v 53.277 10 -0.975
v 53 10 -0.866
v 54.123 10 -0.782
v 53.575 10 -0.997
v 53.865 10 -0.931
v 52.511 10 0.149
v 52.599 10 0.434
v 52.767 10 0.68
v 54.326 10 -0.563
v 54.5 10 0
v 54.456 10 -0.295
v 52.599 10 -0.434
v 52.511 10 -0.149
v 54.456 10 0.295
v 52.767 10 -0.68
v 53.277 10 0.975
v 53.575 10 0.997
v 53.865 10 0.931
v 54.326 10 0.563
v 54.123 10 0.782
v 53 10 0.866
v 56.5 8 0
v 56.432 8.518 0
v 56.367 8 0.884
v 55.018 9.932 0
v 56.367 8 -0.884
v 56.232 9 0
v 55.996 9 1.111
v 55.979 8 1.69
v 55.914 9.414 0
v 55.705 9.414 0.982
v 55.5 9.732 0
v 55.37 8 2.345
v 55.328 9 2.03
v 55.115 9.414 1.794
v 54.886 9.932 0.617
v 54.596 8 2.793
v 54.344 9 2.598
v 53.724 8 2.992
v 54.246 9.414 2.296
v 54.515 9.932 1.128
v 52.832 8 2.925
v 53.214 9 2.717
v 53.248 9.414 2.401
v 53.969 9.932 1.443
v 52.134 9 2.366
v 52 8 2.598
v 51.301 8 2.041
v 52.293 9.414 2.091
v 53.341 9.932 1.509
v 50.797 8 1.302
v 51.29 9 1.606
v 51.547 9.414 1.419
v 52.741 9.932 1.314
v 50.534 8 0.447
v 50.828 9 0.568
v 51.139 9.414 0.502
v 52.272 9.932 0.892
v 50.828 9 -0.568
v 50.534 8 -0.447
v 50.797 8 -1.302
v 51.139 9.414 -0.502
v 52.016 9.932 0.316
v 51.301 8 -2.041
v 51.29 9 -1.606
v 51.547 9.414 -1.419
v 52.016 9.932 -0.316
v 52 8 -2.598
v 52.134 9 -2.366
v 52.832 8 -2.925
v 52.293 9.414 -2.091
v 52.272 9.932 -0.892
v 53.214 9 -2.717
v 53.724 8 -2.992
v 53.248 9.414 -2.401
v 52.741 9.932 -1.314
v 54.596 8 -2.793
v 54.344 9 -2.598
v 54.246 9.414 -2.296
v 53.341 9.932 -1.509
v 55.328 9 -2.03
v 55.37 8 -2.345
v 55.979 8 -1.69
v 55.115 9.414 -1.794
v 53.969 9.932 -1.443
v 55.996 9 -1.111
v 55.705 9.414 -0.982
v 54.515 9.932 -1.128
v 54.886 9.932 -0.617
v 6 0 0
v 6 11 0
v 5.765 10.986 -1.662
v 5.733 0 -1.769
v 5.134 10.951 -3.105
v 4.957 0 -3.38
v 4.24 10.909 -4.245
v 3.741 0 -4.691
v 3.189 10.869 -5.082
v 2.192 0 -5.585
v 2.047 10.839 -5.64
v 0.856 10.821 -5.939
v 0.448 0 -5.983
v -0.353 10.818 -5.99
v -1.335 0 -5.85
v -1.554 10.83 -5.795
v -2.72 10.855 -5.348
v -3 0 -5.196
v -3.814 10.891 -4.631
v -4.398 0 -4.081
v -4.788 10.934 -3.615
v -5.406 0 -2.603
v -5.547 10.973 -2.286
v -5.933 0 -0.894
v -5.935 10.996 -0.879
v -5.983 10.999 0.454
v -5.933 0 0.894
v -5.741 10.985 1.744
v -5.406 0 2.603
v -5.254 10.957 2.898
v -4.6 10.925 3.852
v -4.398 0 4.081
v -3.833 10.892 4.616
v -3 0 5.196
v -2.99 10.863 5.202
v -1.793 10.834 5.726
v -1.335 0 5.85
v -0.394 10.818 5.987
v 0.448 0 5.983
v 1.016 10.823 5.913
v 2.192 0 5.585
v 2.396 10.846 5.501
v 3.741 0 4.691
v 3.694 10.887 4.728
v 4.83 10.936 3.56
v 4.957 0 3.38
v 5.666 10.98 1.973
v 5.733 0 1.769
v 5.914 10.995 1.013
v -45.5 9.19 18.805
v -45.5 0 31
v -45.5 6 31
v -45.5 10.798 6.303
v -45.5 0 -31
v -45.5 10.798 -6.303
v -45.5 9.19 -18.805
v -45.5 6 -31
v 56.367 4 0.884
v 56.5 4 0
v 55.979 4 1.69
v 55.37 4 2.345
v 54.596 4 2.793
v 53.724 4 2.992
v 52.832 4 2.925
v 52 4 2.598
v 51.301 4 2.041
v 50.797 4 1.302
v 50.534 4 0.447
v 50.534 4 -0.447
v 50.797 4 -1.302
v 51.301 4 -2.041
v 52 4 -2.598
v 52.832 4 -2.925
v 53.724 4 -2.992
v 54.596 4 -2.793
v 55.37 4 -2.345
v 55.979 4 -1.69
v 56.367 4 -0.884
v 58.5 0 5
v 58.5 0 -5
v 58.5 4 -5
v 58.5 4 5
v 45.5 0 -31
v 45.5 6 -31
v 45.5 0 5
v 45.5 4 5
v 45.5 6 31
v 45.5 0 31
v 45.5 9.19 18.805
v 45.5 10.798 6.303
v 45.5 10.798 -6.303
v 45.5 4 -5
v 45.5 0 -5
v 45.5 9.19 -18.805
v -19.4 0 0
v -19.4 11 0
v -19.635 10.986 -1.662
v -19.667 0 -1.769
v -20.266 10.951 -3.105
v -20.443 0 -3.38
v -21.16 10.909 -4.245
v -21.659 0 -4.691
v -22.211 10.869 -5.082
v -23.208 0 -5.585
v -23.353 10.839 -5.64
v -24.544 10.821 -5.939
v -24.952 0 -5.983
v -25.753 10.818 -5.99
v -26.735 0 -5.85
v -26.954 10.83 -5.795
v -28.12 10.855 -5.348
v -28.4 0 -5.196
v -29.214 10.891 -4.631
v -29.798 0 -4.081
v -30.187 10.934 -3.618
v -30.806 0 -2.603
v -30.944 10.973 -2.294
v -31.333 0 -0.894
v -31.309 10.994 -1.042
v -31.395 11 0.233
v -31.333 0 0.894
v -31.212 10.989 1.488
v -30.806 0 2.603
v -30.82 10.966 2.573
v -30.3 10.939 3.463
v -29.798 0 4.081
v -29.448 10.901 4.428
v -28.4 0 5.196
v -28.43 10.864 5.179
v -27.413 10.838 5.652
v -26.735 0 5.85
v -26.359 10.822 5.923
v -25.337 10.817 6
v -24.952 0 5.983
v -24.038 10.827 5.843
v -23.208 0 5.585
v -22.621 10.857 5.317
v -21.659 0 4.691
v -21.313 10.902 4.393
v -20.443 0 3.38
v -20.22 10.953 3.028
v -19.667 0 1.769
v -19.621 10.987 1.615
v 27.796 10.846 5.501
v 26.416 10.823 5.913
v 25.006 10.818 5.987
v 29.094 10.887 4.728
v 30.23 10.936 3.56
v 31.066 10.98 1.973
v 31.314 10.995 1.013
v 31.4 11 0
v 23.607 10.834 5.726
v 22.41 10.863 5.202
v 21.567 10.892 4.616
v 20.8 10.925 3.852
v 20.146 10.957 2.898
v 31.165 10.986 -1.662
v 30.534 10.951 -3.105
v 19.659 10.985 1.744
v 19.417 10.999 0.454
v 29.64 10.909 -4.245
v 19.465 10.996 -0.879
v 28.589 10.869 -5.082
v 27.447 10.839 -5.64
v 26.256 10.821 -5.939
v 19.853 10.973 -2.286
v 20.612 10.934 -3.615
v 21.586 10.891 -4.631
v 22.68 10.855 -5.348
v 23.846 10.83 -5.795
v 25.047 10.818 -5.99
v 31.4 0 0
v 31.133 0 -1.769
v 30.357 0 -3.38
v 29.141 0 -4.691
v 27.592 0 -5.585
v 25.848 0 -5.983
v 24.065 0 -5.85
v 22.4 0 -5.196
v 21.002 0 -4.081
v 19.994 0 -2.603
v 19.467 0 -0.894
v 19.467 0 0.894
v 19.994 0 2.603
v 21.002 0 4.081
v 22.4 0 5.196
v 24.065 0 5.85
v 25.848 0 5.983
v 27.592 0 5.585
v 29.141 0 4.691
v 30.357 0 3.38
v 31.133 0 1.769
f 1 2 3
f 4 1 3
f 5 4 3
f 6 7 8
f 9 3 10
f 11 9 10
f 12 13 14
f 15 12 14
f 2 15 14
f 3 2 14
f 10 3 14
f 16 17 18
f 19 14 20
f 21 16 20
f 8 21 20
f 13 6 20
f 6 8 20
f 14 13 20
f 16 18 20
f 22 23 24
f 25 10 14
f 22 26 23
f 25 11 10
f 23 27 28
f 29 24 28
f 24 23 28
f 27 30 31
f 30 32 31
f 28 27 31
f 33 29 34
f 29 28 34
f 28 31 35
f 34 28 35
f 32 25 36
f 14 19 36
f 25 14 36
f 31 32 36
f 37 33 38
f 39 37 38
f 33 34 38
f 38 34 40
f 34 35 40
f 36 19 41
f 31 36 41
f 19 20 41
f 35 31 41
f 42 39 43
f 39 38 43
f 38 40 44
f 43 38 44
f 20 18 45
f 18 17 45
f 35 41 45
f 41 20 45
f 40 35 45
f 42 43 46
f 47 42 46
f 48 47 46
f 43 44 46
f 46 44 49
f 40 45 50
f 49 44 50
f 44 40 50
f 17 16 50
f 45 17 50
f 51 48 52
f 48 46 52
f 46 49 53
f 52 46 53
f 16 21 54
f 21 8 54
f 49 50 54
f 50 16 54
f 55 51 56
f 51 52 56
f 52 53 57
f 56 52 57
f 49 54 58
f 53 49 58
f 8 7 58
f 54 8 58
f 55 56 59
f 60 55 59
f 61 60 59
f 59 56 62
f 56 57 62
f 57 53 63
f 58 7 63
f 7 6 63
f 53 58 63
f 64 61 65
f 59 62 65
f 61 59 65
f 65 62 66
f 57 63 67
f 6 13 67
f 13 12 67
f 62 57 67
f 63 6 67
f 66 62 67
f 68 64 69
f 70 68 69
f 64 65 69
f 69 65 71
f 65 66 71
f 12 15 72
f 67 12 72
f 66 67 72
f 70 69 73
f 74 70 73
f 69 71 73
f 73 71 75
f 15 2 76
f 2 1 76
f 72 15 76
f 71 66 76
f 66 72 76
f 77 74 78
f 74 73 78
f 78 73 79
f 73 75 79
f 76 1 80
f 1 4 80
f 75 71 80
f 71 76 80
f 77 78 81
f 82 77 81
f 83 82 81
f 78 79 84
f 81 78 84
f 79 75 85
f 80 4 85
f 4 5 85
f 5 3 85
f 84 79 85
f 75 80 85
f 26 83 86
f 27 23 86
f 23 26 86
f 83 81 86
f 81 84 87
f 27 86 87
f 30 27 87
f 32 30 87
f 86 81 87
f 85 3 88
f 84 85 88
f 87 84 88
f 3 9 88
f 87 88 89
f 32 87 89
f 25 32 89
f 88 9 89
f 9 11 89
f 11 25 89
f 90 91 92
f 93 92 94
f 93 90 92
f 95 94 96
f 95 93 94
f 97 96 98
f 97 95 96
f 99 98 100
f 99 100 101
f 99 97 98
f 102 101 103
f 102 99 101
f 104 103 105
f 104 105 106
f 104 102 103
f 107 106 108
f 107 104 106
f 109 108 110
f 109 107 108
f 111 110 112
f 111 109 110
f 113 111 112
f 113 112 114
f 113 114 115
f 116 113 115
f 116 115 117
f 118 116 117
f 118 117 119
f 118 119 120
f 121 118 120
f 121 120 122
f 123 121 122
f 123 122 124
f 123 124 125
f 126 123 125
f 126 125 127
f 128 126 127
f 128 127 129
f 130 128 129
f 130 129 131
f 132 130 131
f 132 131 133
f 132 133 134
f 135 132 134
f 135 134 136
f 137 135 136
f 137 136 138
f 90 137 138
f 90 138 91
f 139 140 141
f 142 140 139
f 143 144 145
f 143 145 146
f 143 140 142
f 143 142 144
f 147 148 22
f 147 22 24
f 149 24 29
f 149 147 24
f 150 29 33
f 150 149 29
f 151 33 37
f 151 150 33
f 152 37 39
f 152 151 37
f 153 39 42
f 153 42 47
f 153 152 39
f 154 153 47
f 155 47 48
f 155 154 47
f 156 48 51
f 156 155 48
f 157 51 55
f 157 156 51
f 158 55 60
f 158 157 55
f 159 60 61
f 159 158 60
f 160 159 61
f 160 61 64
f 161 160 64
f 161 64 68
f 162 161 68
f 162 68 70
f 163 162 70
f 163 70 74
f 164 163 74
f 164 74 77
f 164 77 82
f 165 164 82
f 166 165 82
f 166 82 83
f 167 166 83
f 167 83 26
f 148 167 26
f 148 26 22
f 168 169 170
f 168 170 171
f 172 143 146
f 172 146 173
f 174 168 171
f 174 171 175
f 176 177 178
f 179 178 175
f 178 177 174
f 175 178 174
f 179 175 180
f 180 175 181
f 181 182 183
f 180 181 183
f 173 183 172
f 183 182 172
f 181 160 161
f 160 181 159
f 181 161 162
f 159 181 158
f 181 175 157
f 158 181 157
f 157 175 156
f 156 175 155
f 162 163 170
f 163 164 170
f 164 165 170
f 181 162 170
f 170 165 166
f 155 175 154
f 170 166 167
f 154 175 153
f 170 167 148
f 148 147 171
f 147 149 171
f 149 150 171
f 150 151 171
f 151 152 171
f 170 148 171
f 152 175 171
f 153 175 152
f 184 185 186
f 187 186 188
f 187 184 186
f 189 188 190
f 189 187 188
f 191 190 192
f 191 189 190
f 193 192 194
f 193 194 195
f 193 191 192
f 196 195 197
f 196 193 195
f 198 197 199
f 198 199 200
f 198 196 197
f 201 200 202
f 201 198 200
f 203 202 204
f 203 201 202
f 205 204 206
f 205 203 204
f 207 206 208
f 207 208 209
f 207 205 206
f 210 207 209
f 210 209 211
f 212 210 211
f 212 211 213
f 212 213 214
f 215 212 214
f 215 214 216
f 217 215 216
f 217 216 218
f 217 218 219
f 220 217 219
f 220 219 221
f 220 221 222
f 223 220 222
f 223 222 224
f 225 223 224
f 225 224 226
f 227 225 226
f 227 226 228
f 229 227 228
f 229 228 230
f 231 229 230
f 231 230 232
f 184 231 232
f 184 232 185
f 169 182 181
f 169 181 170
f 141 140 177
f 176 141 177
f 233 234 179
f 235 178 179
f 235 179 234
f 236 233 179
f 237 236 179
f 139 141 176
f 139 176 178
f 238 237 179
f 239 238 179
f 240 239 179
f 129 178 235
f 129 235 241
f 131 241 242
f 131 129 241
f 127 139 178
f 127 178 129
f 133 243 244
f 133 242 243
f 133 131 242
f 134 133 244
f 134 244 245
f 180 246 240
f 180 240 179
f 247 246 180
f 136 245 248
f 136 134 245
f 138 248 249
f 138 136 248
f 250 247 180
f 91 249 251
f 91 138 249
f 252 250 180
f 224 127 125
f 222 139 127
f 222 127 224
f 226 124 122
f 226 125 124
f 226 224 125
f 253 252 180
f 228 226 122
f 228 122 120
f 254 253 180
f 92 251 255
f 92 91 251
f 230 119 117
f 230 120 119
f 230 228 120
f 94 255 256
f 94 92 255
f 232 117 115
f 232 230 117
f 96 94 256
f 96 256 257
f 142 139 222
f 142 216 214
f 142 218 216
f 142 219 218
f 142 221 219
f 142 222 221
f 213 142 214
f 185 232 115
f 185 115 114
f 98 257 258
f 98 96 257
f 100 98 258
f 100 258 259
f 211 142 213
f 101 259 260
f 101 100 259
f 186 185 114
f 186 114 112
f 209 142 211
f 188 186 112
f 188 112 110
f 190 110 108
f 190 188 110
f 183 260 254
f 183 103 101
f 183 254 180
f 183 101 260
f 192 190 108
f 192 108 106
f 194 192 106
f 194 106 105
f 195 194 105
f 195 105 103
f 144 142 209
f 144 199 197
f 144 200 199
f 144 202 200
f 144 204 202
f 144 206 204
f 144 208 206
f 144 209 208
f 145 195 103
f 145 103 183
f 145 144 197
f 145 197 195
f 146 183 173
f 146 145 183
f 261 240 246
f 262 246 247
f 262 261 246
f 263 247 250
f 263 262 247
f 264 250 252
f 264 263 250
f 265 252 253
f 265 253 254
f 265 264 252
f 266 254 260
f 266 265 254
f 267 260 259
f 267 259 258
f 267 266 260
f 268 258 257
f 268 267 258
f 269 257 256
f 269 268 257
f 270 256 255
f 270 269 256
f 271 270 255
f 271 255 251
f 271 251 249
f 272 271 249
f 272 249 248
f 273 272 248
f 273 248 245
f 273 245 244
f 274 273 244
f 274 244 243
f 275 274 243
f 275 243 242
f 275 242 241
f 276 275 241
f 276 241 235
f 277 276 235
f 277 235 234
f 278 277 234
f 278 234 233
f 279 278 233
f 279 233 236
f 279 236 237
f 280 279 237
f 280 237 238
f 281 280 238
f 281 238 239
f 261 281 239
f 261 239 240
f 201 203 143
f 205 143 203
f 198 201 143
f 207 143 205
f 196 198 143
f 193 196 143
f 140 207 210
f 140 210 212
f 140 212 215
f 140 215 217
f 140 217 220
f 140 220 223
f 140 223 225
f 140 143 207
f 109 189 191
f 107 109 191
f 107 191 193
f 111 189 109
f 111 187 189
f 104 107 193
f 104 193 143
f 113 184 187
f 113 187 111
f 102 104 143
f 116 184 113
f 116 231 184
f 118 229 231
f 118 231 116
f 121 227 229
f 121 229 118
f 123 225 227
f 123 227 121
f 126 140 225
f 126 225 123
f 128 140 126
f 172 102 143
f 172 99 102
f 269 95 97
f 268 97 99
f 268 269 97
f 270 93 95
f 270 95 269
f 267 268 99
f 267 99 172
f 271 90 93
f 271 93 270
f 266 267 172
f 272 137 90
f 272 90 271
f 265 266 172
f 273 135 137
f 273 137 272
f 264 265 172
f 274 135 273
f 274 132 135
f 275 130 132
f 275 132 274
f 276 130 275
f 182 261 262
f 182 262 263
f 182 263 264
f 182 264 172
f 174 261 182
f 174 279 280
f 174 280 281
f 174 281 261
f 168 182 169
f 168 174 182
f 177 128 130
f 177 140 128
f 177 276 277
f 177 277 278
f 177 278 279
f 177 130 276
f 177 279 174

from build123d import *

# Parameters (mm, degrees)
SKETCH1_W           = 91
SKETCH1_H           = 62
SKETCH1_R           = 6
BOSS_EXTRUDE1_DEPTH = 6
SKETCH16_W          = 3
SKETCH16_H          = 10
SKETCH16_W_2        = 10
SKETCH16_R          = 3
BOSS_EXTRUDE3_DEPTH = 4
SKETCH16_4_R        = 3
BOSS_EXTRUDE4_DEPTH = 10
FILLET1_R           = 2
BOSS_EXTRUDE5_DEPTH = 91
SKETCH1_2_R         = 6
CUT_EXTRUDE1_DEPTH  = 12


with BuildPart() as part:
    # Sketch1 → Boss-Extrude1 (new body)
    with BuildSketch(Plane(origin=(0, 0, 0), x_dir=(1, 0, 0), z_dir=(0, 1, 0))):
        Rectangle(SKETCH1_W, SKETCH1_H)
        with Locations((-25.4, 0)):
            Circle(SKETCH1_R, mode=Mode.SUBTRACT)
        Circle(SKETCH1_R, mode=Mode.SUBTRACT)
        with Locations((25.4, 0)):
            Circle(SKETCH1_R, mode=Mode.SUBTRACT)
    extrude(amount=BOSS_EXTRUDE1_DEPTH)

    # Sketch16 → Boss-Extrude3 (add)
    with BuildSketch(Plane.XZ):
        with Locations((47, 0)):
            Rectangle(SKETCH16_W, SKETCH16_H)
        with Locations((53.5, 0)):
            Rectangle(SKETCH16_W_2, SKETCH16_H)
        with Locations((53.5, 0)):
            Circle(SKETCH16_R, mode=Mode.SUBTRACT)
        with Locations((53.5, 0)):
            Circle(SKETCH16_R)
    extrude(amount=-BOSS_EXTRUDE3_DEPTH)

    # Sketch16<4> → Boss-Extrude4 (add)
    with BuildSketch(Plane.XZ):
        with Locations((53.5, 0)):
            Circle(SKETCH16_4_R)
    extrude(amount=-BOSS_EXTRUDE4_DEPTH)

    # Fillet1
    fillet1_edges = [part.edges().sort_by_distance(p)[0] for p in [
        (50.5, 10, 0),
    ]]
    fillet(fillet1_edges, radius=FILLET1_R)

    # Sketch17 → Boss-Extrude5 (add)
    with BuildSketch(Plane.ZY.offset(45.5)):
        with BuildLine():
            Line((-31, 6), (31, 6))
            ThreePointArc((31, 6), (0, 11), (-31, 6))
        make_face()
    extrude(amount=-BOSS_EXTRUDE5_DEPTH)

    # Sketch1<2> → Cut-Extrude1 (cut, through all)
    with BuildSketch(Plane(origin=(0, 0, 0), x_dir=(1, 0, 0), z_dir=(0, 1, 0))):
        with Locations((-25.4, 0)):
            Circle(SKETCH1_2_R)
        Circle(SKETCH1_2_R)
        with Locations((25.4, 0)):
            Circle(SKETCH1_2_R)
    extrude(amount=CUT_EXTRUDE1_DEPTH, mode=Mode.SUBTRACT)


solid = part.part
